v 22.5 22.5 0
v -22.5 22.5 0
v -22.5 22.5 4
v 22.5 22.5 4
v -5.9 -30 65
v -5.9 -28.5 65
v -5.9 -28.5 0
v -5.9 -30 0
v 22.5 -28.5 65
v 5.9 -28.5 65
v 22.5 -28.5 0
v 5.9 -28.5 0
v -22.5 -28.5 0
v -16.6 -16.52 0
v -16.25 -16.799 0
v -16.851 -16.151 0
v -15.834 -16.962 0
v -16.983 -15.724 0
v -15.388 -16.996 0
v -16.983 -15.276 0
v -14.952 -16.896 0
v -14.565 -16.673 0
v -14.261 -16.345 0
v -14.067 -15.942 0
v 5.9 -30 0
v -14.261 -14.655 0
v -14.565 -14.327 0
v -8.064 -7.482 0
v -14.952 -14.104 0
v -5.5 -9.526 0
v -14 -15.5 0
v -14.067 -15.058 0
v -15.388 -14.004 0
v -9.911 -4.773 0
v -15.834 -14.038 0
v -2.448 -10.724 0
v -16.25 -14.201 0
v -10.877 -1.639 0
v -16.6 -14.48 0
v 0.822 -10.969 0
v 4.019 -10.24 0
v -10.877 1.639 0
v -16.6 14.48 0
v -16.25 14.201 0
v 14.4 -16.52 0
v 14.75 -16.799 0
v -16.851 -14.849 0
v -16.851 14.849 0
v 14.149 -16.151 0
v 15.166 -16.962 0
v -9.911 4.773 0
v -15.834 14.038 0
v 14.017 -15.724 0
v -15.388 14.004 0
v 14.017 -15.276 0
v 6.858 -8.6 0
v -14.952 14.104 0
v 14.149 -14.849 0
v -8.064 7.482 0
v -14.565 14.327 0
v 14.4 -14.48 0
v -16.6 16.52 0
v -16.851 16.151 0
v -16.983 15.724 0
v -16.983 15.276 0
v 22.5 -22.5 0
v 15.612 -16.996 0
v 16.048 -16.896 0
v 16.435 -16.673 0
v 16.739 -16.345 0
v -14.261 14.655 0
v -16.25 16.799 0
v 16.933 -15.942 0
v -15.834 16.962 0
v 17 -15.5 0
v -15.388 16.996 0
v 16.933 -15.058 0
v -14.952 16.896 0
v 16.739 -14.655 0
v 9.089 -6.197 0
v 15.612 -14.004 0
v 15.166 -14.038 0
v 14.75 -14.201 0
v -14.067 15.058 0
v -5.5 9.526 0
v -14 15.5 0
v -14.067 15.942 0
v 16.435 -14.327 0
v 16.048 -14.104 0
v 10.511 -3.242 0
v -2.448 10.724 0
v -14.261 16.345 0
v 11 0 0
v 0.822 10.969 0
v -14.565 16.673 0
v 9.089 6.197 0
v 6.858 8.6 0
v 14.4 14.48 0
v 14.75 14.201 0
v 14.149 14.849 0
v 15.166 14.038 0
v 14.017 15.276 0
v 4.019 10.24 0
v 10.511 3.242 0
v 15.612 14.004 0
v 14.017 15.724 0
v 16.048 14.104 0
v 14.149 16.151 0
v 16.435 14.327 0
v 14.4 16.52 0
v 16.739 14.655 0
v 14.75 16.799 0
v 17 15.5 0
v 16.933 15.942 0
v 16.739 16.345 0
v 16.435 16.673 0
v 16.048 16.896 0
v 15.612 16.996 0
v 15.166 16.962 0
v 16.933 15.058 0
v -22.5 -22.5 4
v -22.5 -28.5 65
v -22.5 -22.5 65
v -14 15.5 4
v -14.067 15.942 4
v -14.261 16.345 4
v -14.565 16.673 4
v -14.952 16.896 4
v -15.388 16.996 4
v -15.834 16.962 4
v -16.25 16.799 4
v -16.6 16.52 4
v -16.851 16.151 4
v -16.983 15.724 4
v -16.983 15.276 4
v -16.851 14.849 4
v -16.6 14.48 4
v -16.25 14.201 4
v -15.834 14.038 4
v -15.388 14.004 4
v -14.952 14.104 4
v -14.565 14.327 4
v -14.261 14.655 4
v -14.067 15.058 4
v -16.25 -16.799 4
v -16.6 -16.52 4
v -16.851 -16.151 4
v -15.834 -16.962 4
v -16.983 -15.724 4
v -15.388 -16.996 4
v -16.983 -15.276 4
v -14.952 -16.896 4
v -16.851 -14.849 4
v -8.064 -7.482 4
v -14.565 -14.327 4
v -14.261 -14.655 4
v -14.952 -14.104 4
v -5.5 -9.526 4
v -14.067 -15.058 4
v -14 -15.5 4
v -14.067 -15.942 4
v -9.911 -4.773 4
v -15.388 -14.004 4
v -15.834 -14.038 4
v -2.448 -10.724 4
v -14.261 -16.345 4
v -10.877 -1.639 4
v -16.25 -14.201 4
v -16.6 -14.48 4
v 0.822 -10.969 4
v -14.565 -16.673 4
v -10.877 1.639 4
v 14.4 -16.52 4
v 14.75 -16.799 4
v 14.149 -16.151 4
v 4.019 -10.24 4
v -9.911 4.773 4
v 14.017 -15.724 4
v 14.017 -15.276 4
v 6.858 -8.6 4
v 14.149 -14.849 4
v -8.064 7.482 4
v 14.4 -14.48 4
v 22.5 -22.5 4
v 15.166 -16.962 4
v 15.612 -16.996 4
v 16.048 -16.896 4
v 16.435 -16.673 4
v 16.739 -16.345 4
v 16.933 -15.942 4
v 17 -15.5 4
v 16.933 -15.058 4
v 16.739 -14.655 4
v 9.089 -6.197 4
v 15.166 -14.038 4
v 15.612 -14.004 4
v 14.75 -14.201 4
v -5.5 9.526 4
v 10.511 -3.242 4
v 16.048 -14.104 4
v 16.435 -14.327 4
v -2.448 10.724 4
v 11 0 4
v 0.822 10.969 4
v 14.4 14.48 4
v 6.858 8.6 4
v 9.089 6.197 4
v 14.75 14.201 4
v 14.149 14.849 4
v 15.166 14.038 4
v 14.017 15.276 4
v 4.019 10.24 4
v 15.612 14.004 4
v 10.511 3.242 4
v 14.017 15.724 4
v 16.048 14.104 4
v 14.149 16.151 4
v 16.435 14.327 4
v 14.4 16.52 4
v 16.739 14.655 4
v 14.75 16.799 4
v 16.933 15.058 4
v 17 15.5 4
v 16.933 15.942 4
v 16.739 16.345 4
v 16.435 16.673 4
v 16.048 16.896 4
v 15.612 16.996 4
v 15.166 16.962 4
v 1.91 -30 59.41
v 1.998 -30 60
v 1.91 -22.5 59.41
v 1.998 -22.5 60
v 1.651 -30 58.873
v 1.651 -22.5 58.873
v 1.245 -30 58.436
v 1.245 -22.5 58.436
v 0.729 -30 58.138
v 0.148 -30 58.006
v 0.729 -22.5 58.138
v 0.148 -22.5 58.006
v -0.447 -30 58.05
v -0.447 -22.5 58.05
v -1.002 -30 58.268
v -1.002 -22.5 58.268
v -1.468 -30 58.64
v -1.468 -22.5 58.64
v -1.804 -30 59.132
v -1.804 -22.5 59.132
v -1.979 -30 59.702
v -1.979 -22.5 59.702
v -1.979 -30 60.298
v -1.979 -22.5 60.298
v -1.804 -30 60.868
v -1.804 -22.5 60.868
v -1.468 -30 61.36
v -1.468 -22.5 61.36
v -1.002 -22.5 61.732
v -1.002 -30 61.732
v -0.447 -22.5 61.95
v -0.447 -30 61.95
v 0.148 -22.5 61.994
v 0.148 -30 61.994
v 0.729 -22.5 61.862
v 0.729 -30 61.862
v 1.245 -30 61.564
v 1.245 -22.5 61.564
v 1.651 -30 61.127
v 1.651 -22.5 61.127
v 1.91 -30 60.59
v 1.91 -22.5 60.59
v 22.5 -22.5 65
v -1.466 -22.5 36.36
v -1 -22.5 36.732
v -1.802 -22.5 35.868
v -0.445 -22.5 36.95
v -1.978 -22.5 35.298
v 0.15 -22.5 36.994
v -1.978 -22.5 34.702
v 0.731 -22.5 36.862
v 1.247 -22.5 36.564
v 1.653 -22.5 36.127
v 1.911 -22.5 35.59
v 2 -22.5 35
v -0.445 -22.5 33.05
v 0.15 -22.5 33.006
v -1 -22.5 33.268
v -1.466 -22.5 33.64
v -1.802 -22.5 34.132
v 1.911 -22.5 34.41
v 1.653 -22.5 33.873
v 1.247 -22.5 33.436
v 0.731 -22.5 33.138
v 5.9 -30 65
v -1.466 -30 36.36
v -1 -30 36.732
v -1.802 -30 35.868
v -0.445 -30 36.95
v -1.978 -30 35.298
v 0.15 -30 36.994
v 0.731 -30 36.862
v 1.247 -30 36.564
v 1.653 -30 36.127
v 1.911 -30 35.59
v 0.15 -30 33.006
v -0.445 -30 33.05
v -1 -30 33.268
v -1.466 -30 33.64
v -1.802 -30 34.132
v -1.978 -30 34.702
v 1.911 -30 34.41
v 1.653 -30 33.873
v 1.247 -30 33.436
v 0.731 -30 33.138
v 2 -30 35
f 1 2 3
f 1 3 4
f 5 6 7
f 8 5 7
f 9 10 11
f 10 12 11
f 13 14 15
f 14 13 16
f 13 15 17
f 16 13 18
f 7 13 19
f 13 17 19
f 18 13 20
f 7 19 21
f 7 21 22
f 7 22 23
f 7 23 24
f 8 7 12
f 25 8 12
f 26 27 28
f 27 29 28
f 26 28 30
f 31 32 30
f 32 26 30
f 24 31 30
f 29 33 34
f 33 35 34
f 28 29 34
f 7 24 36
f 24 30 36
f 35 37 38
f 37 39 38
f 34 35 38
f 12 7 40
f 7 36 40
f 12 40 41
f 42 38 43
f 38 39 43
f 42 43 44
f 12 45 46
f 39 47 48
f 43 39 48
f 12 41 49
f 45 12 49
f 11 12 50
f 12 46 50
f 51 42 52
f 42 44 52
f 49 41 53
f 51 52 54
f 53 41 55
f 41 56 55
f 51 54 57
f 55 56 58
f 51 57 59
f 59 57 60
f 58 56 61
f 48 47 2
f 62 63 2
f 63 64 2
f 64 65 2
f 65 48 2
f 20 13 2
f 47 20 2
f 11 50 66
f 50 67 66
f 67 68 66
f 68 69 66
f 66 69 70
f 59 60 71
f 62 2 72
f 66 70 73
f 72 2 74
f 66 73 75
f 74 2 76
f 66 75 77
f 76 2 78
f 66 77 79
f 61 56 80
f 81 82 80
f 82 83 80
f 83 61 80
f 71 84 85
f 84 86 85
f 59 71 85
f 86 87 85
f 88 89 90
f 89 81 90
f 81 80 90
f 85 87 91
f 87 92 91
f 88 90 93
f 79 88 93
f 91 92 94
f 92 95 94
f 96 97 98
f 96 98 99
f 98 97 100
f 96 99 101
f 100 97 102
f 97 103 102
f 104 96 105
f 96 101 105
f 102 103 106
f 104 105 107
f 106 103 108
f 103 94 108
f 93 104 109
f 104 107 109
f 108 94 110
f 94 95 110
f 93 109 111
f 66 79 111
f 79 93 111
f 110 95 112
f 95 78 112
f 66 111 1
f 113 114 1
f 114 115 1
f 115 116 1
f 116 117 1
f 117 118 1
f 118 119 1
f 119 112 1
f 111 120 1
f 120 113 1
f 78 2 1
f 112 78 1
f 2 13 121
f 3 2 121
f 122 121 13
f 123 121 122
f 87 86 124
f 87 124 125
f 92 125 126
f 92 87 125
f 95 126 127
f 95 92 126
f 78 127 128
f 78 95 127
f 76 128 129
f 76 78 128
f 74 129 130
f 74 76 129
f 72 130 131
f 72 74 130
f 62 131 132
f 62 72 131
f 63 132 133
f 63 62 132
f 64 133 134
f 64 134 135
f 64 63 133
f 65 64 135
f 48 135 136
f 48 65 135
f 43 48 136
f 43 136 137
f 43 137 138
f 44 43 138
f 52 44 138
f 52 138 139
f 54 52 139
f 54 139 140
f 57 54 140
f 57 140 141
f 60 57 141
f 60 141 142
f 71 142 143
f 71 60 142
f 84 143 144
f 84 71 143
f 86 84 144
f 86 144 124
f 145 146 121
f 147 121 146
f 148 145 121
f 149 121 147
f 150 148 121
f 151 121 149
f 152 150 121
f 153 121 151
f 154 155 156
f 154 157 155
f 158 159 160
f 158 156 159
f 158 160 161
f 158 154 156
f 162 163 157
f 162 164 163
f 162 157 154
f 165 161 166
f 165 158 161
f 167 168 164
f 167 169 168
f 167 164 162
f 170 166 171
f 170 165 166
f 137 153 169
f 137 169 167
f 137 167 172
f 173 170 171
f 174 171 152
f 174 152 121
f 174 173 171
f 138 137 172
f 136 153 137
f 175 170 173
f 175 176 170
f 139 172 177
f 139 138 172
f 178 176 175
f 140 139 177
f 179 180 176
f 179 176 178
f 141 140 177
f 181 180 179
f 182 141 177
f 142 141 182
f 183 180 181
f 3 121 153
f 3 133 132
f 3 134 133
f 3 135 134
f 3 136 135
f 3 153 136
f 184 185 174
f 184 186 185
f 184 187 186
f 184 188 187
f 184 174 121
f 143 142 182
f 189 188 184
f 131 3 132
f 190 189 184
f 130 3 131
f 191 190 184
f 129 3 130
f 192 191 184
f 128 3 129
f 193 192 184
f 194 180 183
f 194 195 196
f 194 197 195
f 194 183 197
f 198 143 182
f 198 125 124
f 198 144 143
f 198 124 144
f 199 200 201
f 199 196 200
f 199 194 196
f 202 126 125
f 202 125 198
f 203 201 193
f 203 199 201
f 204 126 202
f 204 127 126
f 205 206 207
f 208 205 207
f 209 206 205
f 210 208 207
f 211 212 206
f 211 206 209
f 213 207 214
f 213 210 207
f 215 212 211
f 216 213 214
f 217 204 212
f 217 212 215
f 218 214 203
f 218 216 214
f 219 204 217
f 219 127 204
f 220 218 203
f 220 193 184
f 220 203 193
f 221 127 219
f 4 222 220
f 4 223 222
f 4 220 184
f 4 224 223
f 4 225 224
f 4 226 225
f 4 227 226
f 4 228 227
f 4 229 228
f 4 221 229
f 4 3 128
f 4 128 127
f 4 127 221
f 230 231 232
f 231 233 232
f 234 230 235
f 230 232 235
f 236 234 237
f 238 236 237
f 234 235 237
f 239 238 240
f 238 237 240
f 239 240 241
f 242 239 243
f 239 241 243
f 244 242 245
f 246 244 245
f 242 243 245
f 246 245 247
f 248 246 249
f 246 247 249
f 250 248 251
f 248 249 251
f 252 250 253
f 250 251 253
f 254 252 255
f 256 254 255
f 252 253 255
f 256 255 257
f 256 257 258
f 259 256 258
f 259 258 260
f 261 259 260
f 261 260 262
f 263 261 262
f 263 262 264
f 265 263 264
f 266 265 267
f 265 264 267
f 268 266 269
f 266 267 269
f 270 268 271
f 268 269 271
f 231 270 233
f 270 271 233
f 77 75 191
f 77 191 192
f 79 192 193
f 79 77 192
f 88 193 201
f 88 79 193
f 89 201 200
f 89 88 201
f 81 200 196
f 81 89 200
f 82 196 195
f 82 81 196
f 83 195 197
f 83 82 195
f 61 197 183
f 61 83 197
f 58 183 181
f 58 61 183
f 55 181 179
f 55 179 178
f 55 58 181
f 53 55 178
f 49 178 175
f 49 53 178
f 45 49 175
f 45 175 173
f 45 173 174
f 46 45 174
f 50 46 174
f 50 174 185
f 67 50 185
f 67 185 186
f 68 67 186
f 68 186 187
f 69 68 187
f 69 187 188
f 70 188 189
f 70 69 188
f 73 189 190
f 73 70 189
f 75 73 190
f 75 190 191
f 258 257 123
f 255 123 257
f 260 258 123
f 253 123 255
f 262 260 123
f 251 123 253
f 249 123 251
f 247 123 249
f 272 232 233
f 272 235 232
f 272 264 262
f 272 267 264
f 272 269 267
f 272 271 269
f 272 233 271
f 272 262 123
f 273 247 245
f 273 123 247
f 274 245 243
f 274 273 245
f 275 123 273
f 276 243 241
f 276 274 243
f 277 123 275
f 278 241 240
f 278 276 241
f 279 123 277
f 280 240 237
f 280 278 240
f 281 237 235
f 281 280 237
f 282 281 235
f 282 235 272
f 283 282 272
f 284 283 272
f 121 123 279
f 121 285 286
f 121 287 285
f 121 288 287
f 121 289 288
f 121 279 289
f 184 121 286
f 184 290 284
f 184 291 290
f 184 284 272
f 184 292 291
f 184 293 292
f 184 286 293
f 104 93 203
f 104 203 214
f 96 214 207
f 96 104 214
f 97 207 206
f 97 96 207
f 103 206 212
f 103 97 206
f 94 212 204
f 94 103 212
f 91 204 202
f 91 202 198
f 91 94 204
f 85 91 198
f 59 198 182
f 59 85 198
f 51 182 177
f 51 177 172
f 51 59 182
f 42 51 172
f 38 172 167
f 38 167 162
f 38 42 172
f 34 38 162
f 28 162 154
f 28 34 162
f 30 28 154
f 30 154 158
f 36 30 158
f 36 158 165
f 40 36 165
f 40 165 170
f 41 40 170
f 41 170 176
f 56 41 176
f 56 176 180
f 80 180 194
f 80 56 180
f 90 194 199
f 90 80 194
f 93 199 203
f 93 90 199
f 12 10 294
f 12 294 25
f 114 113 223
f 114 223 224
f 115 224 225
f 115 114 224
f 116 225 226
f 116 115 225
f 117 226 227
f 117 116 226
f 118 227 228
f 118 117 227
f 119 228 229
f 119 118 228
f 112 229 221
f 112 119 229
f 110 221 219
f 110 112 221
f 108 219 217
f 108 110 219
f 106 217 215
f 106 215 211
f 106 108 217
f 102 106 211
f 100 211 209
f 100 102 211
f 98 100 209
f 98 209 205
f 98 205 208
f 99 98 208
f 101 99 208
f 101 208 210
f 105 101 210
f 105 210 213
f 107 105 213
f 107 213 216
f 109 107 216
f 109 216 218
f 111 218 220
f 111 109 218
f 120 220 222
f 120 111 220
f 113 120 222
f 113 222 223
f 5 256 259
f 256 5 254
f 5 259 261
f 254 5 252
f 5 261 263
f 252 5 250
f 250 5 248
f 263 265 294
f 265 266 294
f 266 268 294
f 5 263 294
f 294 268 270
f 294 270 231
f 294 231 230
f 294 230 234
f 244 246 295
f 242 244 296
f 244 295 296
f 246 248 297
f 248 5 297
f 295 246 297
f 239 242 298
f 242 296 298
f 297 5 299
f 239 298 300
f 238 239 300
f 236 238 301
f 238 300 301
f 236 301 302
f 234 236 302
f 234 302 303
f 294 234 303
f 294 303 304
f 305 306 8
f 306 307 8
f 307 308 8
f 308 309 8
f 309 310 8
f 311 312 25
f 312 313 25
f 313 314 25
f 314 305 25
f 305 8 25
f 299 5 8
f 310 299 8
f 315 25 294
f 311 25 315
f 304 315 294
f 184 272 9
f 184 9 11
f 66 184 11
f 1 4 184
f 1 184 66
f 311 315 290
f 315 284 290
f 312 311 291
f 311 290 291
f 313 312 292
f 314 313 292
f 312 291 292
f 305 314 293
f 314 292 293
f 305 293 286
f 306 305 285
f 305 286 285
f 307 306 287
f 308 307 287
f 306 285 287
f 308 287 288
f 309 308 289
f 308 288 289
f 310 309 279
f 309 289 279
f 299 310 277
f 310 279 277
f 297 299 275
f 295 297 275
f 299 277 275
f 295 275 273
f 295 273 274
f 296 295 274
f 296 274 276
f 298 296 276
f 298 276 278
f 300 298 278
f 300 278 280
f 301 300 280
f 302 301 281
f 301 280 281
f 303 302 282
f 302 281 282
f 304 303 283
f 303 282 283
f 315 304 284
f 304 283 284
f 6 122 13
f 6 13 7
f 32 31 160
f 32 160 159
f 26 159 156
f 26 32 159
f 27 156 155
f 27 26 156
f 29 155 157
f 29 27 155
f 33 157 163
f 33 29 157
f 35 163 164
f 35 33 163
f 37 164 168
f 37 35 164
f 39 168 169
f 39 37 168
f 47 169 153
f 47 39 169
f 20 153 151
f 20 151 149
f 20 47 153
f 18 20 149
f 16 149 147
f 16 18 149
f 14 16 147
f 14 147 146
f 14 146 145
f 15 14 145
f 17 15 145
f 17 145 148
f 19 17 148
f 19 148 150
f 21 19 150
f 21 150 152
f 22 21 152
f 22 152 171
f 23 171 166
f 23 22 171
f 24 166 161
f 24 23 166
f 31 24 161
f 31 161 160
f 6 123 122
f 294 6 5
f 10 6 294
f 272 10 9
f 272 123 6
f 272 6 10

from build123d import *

# Parameters (mm, degrees)
SKETCH1_W           = 45
SKETCH1_H           = 45
SKETCH1_R           = 11
SKETCH1_R_2         = 1.5
BOSS_EXTRUDE1_DEPTH = 4
BOSS_EXTRUDE2_START = 1.649921
SKETCH2_W           = 2.999997759
SKETCH2_H           = 65
SKETCH2_W_2         = 13.199968027
SKETCH2_W_3         = 0.399954884
SKETCH2_W_4         = 11.8
SKETCH2_R           = 2
BOSS_EXTRUDE2_DEPTH = 6
BOSS_EXTRUDE4_START = -4.350079
SKETCH2_5_W         = 11.8
SKETCH2_5_H         = 65
SKETCH2_5_R         = 2
BOSS_EXTRUDE4_DEPTH = 1.5


with BuildPart() as part:
    # Sketch1 → Boss-Extrude1 (new body)
    with BuildSketch(Plane.XY):
        Rectangle(SKETCH1_W, SKETCH1_H)
        Polygon((20.15, -20.15), (20.15, -16.735786438), (20.15, 16.735786438), (16.735786438, 20.15), (-16.735786438, 20.15), (-20.15, 16.735786438), (-20.15, 16.077064234), (-20.15, -16.735786438), (-20.15, -20.15), (-16.735786438, -20.15), (16.735786438, -20.15), align=None, mode=Mode.SUBTRACT)
        Polygon((16.735786438, -20.15), (20.15, -20.15), (20.15, -16.735786438), (20.15, 16.735786438), (16.735786438, 20.15), (-16.735786438, 20.15), (-20.15, 16.735786438), (-20.15, 16.077064234), (-20.15, -16.735786438), (-20.15, -20.15), (-16.735786438, -20.15), align=None)
        Circle(SKETCH1_R, mode=Mode.SUBTRACT)
        with Locations((15.5, -15.5)):
            Circle(SKETCH1_R_2, mode=Mode.SUBTRACT)
        with Locations((15.5, 15.5)):
            Circle(SKETCH1_R_2, mode=Mode.SUBTRACT)
        with Locations((-15.5, -15.5)):
            Circle(SKETCH1_R_2, mode=Mode.SUBTRACT)
        with Locations((-15.5, 15.5)):
            Circle(SKETCH1_R_2, mode=Mode.SUBTRACT)
    extrude(amount=BOSS_EXTRUDE1_DEPTH)

    # Sketch2 → Boss-Extrude2 (add)
    with BuildSketch(Plane(origin=(0, -24.14992067, 0), x_dir=(1, 0, 0), z_dir=(0, 1, 0)).offset(BOSS_EXTRUDE2_START)):
        with Locations((21.000001121, -32.5)):
            Rectangle(SKETCH2_W, SKETCH2_H)
        with Locations((12.900018228, -32.5)):
            Rectangle(SKETCH2_W_2, SKETCH2_H)
        Polygon((-22.5, -65), (-5.89992067, -65), (-5.89992067, 0), (-19.499922911, 0), (-22.5, 0), align=None)
        with Locations((6.100056772, -32.5)):
            Rectangle(SKETCH2_W_3, SKETCH2_H)
        with Locations((7.933e-05, -32.5)):
            Rectangle(SKETCH2_W_4, SKETCH2_H)
        with Locations((-0.001608903, -59.999999943)):
            Circle(SKETCH2_R, mode=Mode.SUBTRACT)
        with Locations((7.933e-05, -35)):
            Circle(SKETCH2_R, mode=Mode.SUBTRACT)
    extrude(amount=-BOSS_EXTRUDE2_DEPTH)

    # Sketch2<5> → Boss-Extrude4 (add)
    with BuildSketch(Plane(origin=(0, -24.14992067, 0), x_dir=(1, 0, 0), z_dir=(0, 1, 0)).offset(BOSS_EXTRUDE4_START)):
        with Locations((7.933e-05, -32.5)):
            Rectangle(SKETCH2_5_W, SKETCH2_5_H)
        with Locations((-0.001608903, -59.999999943)):
            Circle(SKETCH2_5_R, mode=Mode.SUBTRACT)
        with Locations((7.933e-05, -35)):
            Circle(SKETCH2_5_R, mode=Mode.SUBTRACT)
    extrude(amount=-BOSS_EXTRUDE4_DEPTH)


solid = part.part
